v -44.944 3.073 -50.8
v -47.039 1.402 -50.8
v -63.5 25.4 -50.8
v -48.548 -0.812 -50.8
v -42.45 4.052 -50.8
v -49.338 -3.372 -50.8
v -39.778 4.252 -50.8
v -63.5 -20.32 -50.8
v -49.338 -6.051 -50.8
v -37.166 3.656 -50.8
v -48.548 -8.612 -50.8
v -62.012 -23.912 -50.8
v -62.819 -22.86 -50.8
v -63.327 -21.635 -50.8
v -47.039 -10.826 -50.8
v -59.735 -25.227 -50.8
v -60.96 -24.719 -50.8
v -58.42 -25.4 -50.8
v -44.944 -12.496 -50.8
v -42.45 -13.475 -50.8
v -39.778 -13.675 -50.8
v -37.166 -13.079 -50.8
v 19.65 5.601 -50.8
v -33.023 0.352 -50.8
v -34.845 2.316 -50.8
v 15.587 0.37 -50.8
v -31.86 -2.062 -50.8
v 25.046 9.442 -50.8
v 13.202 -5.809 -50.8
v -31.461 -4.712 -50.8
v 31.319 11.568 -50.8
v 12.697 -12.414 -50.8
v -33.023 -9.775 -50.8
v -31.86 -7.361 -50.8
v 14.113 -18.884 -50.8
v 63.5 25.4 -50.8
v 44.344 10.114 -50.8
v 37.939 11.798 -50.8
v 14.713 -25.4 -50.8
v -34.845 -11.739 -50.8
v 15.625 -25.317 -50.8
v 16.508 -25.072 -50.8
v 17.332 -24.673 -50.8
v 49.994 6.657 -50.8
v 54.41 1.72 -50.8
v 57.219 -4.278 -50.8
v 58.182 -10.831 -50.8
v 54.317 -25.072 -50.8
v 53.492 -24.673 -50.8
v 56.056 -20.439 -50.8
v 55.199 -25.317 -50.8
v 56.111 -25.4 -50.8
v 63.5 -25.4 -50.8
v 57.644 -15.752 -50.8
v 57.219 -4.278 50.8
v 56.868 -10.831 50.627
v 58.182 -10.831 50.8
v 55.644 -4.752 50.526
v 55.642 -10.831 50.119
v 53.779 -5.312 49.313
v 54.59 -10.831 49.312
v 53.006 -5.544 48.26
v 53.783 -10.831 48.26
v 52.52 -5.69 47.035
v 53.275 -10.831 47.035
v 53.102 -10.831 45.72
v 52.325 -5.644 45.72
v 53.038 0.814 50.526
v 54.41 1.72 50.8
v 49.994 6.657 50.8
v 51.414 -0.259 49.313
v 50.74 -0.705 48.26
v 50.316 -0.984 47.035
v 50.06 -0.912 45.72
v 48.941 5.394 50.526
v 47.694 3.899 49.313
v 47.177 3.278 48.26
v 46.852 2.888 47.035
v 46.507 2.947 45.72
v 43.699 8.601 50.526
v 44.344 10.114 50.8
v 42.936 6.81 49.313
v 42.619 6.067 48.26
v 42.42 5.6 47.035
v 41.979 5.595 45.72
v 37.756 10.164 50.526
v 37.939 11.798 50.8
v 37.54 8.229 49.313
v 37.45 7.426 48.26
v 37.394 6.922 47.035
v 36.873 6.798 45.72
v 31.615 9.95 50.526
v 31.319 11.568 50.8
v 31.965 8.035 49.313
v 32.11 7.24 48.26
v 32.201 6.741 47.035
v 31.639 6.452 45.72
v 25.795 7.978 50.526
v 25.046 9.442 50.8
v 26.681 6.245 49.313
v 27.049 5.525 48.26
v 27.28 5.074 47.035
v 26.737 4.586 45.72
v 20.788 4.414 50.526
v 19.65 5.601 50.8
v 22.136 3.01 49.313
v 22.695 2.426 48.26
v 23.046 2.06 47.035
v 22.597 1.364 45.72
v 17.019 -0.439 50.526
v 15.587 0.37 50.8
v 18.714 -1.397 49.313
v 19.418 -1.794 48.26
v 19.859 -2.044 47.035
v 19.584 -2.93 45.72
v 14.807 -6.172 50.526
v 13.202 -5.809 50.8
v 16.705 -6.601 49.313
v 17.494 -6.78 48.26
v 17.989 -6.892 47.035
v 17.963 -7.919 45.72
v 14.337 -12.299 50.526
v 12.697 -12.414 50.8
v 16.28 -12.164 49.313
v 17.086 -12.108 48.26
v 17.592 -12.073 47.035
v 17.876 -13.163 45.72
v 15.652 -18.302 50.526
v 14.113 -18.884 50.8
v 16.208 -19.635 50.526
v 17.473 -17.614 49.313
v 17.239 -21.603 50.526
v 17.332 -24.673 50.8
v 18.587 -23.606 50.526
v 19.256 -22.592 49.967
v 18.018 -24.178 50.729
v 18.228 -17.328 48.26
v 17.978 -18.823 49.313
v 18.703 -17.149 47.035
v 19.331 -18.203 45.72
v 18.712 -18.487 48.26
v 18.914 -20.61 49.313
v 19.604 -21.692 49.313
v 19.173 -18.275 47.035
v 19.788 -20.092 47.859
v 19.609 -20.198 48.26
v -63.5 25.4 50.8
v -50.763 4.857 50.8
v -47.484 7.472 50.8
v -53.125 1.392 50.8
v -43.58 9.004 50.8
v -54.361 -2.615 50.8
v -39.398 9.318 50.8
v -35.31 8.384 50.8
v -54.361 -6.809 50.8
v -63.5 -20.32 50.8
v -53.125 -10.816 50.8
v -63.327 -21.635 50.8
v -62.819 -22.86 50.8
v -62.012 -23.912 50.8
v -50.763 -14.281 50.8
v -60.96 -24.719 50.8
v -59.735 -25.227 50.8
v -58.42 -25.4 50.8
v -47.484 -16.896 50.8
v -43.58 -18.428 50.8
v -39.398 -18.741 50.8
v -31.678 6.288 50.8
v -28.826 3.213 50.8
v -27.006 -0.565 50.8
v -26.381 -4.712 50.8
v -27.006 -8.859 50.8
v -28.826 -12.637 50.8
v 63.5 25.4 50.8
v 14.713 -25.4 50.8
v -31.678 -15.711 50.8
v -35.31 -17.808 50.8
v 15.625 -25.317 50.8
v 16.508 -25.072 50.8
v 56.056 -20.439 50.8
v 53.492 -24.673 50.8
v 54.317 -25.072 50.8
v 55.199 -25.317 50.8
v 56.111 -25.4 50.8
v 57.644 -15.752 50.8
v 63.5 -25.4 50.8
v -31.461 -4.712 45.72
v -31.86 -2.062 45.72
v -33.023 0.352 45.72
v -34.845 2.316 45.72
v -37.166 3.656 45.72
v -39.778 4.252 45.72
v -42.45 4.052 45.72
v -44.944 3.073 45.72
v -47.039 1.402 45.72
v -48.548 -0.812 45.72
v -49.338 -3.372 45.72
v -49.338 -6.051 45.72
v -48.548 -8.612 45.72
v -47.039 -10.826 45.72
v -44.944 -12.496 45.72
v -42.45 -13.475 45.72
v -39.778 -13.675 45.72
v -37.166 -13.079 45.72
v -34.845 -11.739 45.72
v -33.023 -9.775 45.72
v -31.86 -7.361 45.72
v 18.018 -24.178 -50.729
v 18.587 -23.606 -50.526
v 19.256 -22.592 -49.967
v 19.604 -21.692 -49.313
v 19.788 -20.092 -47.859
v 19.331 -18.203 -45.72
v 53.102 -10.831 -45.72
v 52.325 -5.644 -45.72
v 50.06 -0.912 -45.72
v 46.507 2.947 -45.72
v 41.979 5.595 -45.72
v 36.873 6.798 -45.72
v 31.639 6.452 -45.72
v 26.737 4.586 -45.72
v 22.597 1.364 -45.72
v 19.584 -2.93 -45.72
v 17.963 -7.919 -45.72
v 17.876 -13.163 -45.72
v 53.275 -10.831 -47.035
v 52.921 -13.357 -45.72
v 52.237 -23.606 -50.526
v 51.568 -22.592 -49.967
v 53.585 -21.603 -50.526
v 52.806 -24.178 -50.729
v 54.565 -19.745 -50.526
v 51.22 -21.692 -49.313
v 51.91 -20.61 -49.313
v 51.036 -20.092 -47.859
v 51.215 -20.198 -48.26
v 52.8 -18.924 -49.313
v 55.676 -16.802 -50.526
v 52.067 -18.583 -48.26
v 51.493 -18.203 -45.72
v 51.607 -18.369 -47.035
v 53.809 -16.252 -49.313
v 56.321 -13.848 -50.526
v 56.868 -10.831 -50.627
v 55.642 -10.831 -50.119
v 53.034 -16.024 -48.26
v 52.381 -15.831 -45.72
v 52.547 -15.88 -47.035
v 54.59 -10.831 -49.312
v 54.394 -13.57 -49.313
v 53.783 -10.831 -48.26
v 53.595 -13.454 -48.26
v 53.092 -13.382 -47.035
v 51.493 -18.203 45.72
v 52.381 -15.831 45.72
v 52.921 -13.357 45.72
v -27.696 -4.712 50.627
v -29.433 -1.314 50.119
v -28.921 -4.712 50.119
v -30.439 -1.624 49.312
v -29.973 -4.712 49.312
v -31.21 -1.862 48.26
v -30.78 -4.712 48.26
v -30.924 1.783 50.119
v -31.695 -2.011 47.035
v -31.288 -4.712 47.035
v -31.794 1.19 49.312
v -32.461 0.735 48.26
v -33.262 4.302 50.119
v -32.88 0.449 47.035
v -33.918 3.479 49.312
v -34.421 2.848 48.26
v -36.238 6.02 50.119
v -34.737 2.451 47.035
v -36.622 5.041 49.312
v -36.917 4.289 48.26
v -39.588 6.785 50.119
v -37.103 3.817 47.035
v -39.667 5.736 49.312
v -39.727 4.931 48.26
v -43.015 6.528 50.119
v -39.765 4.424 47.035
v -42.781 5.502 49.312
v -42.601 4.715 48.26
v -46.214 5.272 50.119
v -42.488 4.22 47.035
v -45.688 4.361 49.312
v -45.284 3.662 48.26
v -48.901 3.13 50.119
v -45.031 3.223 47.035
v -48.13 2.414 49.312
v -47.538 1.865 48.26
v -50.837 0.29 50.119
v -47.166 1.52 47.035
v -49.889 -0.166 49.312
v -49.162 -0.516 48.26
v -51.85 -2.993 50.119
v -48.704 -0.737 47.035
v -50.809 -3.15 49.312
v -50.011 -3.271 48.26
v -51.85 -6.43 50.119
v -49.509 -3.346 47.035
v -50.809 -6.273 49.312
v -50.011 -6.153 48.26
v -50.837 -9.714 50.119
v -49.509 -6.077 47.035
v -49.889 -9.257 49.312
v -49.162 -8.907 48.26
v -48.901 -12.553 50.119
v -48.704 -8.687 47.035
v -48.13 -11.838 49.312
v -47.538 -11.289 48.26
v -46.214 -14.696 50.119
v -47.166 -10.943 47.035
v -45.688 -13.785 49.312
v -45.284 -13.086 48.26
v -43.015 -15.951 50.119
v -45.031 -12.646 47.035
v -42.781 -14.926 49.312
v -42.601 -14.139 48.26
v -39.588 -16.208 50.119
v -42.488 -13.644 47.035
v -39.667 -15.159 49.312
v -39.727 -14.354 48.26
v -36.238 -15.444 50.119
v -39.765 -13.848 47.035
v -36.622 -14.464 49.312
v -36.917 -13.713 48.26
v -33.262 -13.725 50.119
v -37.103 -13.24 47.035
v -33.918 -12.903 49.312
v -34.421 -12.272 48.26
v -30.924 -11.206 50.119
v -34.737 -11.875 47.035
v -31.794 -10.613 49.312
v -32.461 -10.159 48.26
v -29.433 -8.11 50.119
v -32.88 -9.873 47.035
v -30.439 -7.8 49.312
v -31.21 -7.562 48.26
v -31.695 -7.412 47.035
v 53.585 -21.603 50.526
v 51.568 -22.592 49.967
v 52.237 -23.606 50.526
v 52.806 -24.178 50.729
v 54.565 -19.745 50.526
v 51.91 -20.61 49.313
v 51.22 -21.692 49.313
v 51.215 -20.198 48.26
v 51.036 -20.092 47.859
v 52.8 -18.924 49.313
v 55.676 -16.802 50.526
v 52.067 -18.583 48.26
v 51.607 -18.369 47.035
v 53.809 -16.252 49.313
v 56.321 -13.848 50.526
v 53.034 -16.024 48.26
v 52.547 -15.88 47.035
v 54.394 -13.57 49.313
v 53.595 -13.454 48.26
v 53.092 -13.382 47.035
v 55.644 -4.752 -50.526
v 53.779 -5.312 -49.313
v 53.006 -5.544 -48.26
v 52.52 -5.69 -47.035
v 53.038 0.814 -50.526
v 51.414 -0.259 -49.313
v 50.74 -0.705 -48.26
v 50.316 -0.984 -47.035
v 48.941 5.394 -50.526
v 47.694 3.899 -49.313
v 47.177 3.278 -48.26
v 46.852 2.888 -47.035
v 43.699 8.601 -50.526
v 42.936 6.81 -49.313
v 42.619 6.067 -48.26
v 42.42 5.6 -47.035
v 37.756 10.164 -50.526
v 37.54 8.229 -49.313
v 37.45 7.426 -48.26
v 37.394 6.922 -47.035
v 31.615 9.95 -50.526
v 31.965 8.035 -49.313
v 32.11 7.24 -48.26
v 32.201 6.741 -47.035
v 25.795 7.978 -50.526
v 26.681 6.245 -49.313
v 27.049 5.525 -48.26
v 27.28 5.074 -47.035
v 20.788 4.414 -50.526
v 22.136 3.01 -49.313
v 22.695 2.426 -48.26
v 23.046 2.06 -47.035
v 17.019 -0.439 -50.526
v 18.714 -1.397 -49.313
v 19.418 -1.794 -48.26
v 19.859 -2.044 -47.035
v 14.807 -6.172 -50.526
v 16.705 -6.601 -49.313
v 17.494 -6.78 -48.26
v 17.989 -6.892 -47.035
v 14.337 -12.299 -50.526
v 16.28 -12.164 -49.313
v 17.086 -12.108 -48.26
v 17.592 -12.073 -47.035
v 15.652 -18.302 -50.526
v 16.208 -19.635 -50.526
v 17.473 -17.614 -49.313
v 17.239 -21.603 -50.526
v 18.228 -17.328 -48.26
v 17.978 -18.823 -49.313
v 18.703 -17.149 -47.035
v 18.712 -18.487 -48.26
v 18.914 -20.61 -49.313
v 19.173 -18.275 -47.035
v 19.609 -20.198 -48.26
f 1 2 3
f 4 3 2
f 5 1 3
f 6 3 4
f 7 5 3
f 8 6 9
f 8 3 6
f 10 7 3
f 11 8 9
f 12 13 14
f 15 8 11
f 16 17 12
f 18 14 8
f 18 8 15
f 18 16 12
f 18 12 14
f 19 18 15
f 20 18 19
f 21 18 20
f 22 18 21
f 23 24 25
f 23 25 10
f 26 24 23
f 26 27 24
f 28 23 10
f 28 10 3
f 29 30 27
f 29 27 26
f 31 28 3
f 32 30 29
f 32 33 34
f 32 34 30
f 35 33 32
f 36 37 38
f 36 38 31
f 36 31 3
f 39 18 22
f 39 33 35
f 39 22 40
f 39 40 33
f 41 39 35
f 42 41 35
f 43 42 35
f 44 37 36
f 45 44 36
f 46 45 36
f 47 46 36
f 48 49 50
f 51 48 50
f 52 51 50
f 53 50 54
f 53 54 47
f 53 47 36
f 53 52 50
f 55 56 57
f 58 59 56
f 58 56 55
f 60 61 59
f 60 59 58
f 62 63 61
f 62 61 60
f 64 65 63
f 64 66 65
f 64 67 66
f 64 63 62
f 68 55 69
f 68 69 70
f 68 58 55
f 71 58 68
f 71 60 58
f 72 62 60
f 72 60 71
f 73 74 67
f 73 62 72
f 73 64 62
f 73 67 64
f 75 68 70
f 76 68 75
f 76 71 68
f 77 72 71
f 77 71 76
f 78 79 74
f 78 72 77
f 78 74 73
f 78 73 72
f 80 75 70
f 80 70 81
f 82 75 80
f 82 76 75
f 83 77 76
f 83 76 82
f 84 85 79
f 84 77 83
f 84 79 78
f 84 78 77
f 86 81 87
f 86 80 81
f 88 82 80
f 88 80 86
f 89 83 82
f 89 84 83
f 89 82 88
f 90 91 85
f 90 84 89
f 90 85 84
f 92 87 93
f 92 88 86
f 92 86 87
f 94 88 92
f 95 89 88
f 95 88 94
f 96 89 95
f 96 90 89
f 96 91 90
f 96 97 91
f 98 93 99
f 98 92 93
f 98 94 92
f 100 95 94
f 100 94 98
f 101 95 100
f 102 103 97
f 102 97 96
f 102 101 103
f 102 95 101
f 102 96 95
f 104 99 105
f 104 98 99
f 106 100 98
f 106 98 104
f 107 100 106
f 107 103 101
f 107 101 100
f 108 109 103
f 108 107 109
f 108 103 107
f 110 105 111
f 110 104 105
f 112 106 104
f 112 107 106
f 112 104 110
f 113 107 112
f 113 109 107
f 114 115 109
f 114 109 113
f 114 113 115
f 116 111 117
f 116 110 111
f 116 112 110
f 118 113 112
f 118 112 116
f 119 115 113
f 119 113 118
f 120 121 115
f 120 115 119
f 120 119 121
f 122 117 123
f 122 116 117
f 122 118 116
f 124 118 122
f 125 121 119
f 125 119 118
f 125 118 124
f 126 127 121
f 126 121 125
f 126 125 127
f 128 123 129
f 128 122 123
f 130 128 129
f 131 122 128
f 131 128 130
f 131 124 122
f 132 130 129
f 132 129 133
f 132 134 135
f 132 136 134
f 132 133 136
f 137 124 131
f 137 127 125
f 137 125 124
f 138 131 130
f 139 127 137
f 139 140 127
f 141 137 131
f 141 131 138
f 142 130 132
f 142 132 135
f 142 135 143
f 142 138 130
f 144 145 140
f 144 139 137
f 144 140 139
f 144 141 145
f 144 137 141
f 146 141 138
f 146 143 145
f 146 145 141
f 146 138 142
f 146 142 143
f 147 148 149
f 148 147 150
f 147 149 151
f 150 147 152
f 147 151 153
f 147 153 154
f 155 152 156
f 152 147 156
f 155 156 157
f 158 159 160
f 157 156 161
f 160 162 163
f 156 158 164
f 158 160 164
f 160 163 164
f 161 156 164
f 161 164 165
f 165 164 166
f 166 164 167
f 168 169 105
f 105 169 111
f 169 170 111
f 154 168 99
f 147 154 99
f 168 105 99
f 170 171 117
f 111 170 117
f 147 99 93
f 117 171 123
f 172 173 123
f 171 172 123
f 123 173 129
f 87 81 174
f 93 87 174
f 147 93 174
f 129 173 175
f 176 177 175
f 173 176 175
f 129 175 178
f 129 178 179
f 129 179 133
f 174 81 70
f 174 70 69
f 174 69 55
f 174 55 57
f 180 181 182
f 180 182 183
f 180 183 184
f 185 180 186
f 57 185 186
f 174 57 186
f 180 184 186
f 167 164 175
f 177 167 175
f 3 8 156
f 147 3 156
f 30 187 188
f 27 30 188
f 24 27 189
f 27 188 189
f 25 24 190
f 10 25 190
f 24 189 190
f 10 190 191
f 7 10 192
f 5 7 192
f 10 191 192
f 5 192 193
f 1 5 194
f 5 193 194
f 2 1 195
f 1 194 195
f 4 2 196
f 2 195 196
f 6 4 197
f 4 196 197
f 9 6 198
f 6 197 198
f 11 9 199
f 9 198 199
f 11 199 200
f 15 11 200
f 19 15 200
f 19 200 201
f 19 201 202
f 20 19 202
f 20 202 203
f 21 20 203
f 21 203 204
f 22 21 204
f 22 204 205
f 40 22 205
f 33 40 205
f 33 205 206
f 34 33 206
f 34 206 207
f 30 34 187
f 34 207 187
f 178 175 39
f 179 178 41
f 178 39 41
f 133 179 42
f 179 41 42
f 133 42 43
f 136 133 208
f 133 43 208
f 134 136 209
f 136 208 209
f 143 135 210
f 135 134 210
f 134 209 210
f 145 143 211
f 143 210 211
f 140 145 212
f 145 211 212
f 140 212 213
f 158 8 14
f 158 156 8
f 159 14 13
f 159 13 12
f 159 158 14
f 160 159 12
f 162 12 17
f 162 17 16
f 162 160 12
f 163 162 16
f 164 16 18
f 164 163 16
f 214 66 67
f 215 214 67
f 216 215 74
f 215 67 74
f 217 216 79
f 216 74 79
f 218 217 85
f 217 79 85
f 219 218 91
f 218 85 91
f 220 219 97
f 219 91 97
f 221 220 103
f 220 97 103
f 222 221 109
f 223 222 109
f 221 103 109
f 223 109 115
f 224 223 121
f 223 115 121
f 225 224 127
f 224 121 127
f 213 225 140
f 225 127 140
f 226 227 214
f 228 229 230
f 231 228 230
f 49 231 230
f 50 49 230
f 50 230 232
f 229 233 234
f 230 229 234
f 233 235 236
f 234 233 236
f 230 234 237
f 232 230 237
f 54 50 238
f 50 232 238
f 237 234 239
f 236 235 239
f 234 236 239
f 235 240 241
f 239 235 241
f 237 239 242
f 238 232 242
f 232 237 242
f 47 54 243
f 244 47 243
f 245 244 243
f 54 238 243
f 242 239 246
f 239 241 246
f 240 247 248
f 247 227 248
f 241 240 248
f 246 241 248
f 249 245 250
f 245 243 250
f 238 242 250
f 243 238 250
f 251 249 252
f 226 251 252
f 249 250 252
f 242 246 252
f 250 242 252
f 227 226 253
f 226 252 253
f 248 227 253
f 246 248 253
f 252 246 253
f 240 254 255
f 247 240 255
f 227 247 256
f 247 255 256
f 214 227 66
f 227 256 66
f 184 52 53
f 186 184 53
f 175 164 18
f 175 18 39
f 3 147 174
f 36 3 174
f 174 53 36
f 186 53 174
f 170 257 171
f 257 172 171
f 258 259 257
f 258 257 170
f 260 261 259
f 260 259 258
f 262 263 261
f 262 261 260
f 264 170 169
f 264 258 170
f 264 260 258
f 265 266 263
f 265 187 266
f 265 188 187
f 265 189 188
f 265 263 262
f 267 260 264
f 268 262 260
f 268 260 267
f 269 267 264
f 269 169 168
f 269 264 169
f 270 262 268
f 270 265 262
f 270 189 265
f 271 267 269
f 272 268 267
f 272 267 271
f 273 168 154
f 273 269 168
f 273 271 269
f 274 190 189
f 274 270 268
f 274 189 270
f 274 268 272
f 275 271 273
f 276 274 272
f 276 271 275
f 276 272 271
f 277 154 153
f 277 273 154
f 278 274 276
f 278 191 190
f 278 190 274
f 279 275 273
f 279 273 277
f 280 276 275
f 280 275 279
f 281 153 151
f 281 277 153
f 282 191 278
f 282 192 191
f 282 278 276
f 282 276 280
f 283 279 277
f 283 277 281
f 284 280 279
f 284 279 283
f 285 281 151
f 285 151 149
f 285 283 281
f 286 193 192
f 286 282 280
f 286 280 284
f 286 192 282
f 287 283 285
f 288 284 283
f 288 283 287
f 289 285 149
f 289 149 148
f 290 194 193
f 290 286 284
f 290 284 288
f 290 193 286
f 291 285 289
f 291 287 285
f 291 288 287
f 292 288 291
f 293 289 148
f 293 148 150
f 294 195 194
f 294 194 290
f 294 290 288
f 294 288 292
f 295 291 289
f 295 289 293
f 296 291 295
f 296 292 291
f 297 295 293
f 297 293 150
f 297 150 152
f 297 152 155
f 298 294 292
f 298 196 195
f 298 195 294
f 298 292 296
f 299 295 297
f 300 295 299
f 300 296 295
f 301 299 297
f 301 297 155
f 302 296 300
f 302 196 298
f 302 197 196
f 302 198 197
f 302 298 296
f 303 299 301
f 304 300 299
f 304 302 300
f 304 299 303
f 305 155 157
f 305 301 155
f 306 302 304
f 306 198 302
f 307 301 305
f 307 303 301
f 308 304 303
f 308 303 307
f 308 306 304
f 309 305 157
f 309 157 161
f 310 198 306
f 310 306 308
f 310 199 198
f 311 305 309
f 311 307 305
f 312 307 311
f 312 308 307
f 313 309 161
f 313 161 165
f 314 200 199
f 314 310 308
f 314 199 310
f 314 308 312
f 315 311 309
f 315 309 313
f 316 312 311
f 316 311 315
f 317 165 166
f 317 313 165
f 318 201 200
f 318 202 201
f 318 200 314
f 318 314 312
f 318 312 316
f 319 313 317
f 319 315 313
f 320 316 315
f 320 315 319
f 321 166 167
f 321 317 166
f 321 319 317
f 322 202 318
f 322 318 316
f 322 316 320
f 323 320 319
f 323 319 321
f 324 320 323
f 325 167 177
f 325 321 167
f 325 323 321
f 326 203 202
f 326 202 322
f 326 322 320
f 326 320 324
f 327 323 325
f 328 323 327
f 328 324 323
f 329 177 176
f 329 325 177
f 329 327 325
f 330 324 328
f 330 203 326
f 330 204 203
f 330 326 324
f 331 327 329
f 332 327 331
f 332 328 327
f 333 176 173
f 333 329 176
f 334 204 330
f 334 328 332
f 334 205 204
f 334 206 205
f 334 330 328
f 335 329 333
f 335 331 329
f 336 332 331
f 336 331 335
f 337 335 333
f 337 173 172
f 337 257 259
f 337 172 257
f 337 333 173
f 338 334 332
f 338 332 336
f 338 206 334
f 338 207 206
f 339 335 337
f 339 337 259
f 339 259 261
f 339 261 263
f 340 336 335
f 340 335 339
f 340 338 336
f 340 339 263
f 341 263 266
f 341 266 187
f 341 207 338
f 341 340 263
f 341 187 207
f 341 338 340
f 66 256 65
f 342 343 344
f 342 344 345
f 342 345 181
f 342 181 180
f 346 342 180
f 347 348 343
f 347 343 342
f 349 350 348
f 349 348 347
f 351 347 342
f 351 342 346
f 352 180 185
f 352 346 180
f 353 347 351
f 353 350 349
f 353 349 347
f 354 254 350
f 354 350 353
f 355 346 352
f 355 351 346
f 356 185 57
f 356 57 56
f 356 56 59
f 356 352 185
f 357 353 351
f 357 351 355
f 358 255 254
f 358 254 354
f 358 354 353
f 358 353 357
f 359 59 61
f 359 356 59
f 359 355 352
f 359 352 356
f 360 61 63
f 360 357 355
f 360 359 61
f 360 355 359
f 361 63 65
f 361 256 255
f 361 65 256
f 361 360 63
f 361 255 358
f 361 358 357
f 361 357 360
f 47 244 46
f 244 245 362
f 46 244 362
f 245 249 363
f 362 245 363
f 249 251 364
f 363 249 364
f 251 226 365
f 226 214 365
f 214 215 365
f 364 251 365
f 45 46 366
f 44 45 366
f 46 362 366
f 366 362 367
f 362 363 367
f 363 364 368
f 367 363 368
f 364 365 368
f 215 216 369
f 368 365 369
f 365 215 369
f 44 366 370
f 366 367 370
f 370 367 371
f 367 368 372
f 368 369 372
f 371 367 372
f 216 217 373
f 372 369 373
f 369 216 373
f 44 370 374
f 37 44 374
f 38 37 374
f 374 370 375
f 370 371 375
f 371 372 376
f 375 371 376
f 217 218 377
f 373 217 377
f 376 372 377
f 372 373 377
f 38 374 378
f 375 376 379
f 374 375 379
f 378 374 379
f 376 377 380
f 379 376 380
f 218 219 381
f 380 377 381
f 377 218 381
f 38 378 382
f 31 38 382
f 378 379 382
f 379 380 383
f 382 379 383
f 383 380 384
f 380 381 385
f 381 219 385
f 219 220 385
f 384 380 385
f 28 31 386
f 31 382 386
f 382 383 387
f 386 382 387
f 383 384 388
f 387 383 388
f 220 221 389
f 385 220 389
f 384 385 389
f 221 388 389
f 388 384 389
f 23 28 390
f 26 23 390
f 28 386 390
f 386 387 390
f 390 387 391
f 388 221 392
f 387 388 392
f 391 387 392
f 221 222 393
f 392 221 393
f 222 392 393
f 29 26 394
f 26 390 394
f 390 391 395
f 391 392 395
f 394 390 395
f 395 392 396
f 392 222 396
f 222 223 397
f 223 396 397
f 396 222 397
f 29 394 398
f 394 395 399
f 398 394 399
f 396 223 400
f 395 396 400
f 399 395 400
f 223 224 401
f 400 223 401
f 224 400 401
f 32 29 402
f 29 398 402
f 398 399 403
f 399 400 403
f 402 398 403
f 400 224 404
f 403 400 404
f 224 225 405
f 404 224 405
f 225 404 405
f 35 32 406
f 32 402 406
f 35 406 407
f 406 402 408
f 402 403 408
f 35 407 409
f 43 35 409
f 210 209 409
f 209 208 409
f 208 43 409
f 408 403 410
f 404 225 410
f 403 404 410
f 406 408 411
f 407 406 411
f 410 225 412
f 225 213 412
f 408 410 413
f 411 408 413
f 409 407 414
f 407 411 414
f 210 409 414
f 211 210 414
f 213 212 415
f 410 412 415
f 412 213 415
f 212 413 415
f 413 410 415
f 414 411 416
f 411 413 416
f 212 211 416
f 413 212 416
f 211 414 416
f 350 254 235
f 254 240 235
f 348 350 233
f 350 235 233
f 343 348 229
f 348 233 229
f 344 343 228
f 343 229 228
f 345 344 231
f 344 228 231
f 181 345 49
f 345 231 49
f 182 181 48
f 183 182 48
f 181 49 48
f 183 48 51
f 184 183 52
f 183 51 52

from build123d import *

# Parameters (mm, degrees)
F0_W     = 127
F0_H     = 101.6
F1_DEPTH = 25.4
F2_R     = 8.9887280552
F3_DEPTH = 101.6
F4_R     = 5.08


with BuildPart() as f1:
    # F0 (on Front) → F1 (new body, symmetric)
    with BuildSketch(Plane.XZ):
        Rectangle(F0_W, F0_H)
    extrude(amount=F1_DEPTH, both=True)

    # F2 (on face) → F3 (cut, through all)
    with BuildSketch(Plane.XY.offset(50.8)):
        with Locations((-40.4497459531, -4.7117564827)):
            Circle(F2_R)
        with BuildLine():
            ThreePointArc((45.4471273464, -25.4), (51.0720367799, -19.060106955), (53.1023527343, -10.8313970268))
            ThreePointArc((53.1023527343, -10.8313970268), (27.1833296796, 4.8286001454), (25.3769518691, -25.4))
            Line((25.3769518691, -25.4), (45.4471273464, -25.4))
        make_face()
    extrude(amount=-F3_DEPTH, mode=Mode.SUBTRACT)

    # F4
    f4_edges = [f1.edges().sort_by_distance(p)[0] for p in [
        (25.376952, -25.4, 0),
        (45.447127, -25.4, 0),
        (-63.5, -25.4, 0),
        (-49.438474, -4.711756, 50.8),
        (35.41204, 6.858916, 50.8),
        (35.41204, 6.858916, -50.8),
    ]]
    fillet(f4_edges, radius=F4_R)


solid = f1.part
